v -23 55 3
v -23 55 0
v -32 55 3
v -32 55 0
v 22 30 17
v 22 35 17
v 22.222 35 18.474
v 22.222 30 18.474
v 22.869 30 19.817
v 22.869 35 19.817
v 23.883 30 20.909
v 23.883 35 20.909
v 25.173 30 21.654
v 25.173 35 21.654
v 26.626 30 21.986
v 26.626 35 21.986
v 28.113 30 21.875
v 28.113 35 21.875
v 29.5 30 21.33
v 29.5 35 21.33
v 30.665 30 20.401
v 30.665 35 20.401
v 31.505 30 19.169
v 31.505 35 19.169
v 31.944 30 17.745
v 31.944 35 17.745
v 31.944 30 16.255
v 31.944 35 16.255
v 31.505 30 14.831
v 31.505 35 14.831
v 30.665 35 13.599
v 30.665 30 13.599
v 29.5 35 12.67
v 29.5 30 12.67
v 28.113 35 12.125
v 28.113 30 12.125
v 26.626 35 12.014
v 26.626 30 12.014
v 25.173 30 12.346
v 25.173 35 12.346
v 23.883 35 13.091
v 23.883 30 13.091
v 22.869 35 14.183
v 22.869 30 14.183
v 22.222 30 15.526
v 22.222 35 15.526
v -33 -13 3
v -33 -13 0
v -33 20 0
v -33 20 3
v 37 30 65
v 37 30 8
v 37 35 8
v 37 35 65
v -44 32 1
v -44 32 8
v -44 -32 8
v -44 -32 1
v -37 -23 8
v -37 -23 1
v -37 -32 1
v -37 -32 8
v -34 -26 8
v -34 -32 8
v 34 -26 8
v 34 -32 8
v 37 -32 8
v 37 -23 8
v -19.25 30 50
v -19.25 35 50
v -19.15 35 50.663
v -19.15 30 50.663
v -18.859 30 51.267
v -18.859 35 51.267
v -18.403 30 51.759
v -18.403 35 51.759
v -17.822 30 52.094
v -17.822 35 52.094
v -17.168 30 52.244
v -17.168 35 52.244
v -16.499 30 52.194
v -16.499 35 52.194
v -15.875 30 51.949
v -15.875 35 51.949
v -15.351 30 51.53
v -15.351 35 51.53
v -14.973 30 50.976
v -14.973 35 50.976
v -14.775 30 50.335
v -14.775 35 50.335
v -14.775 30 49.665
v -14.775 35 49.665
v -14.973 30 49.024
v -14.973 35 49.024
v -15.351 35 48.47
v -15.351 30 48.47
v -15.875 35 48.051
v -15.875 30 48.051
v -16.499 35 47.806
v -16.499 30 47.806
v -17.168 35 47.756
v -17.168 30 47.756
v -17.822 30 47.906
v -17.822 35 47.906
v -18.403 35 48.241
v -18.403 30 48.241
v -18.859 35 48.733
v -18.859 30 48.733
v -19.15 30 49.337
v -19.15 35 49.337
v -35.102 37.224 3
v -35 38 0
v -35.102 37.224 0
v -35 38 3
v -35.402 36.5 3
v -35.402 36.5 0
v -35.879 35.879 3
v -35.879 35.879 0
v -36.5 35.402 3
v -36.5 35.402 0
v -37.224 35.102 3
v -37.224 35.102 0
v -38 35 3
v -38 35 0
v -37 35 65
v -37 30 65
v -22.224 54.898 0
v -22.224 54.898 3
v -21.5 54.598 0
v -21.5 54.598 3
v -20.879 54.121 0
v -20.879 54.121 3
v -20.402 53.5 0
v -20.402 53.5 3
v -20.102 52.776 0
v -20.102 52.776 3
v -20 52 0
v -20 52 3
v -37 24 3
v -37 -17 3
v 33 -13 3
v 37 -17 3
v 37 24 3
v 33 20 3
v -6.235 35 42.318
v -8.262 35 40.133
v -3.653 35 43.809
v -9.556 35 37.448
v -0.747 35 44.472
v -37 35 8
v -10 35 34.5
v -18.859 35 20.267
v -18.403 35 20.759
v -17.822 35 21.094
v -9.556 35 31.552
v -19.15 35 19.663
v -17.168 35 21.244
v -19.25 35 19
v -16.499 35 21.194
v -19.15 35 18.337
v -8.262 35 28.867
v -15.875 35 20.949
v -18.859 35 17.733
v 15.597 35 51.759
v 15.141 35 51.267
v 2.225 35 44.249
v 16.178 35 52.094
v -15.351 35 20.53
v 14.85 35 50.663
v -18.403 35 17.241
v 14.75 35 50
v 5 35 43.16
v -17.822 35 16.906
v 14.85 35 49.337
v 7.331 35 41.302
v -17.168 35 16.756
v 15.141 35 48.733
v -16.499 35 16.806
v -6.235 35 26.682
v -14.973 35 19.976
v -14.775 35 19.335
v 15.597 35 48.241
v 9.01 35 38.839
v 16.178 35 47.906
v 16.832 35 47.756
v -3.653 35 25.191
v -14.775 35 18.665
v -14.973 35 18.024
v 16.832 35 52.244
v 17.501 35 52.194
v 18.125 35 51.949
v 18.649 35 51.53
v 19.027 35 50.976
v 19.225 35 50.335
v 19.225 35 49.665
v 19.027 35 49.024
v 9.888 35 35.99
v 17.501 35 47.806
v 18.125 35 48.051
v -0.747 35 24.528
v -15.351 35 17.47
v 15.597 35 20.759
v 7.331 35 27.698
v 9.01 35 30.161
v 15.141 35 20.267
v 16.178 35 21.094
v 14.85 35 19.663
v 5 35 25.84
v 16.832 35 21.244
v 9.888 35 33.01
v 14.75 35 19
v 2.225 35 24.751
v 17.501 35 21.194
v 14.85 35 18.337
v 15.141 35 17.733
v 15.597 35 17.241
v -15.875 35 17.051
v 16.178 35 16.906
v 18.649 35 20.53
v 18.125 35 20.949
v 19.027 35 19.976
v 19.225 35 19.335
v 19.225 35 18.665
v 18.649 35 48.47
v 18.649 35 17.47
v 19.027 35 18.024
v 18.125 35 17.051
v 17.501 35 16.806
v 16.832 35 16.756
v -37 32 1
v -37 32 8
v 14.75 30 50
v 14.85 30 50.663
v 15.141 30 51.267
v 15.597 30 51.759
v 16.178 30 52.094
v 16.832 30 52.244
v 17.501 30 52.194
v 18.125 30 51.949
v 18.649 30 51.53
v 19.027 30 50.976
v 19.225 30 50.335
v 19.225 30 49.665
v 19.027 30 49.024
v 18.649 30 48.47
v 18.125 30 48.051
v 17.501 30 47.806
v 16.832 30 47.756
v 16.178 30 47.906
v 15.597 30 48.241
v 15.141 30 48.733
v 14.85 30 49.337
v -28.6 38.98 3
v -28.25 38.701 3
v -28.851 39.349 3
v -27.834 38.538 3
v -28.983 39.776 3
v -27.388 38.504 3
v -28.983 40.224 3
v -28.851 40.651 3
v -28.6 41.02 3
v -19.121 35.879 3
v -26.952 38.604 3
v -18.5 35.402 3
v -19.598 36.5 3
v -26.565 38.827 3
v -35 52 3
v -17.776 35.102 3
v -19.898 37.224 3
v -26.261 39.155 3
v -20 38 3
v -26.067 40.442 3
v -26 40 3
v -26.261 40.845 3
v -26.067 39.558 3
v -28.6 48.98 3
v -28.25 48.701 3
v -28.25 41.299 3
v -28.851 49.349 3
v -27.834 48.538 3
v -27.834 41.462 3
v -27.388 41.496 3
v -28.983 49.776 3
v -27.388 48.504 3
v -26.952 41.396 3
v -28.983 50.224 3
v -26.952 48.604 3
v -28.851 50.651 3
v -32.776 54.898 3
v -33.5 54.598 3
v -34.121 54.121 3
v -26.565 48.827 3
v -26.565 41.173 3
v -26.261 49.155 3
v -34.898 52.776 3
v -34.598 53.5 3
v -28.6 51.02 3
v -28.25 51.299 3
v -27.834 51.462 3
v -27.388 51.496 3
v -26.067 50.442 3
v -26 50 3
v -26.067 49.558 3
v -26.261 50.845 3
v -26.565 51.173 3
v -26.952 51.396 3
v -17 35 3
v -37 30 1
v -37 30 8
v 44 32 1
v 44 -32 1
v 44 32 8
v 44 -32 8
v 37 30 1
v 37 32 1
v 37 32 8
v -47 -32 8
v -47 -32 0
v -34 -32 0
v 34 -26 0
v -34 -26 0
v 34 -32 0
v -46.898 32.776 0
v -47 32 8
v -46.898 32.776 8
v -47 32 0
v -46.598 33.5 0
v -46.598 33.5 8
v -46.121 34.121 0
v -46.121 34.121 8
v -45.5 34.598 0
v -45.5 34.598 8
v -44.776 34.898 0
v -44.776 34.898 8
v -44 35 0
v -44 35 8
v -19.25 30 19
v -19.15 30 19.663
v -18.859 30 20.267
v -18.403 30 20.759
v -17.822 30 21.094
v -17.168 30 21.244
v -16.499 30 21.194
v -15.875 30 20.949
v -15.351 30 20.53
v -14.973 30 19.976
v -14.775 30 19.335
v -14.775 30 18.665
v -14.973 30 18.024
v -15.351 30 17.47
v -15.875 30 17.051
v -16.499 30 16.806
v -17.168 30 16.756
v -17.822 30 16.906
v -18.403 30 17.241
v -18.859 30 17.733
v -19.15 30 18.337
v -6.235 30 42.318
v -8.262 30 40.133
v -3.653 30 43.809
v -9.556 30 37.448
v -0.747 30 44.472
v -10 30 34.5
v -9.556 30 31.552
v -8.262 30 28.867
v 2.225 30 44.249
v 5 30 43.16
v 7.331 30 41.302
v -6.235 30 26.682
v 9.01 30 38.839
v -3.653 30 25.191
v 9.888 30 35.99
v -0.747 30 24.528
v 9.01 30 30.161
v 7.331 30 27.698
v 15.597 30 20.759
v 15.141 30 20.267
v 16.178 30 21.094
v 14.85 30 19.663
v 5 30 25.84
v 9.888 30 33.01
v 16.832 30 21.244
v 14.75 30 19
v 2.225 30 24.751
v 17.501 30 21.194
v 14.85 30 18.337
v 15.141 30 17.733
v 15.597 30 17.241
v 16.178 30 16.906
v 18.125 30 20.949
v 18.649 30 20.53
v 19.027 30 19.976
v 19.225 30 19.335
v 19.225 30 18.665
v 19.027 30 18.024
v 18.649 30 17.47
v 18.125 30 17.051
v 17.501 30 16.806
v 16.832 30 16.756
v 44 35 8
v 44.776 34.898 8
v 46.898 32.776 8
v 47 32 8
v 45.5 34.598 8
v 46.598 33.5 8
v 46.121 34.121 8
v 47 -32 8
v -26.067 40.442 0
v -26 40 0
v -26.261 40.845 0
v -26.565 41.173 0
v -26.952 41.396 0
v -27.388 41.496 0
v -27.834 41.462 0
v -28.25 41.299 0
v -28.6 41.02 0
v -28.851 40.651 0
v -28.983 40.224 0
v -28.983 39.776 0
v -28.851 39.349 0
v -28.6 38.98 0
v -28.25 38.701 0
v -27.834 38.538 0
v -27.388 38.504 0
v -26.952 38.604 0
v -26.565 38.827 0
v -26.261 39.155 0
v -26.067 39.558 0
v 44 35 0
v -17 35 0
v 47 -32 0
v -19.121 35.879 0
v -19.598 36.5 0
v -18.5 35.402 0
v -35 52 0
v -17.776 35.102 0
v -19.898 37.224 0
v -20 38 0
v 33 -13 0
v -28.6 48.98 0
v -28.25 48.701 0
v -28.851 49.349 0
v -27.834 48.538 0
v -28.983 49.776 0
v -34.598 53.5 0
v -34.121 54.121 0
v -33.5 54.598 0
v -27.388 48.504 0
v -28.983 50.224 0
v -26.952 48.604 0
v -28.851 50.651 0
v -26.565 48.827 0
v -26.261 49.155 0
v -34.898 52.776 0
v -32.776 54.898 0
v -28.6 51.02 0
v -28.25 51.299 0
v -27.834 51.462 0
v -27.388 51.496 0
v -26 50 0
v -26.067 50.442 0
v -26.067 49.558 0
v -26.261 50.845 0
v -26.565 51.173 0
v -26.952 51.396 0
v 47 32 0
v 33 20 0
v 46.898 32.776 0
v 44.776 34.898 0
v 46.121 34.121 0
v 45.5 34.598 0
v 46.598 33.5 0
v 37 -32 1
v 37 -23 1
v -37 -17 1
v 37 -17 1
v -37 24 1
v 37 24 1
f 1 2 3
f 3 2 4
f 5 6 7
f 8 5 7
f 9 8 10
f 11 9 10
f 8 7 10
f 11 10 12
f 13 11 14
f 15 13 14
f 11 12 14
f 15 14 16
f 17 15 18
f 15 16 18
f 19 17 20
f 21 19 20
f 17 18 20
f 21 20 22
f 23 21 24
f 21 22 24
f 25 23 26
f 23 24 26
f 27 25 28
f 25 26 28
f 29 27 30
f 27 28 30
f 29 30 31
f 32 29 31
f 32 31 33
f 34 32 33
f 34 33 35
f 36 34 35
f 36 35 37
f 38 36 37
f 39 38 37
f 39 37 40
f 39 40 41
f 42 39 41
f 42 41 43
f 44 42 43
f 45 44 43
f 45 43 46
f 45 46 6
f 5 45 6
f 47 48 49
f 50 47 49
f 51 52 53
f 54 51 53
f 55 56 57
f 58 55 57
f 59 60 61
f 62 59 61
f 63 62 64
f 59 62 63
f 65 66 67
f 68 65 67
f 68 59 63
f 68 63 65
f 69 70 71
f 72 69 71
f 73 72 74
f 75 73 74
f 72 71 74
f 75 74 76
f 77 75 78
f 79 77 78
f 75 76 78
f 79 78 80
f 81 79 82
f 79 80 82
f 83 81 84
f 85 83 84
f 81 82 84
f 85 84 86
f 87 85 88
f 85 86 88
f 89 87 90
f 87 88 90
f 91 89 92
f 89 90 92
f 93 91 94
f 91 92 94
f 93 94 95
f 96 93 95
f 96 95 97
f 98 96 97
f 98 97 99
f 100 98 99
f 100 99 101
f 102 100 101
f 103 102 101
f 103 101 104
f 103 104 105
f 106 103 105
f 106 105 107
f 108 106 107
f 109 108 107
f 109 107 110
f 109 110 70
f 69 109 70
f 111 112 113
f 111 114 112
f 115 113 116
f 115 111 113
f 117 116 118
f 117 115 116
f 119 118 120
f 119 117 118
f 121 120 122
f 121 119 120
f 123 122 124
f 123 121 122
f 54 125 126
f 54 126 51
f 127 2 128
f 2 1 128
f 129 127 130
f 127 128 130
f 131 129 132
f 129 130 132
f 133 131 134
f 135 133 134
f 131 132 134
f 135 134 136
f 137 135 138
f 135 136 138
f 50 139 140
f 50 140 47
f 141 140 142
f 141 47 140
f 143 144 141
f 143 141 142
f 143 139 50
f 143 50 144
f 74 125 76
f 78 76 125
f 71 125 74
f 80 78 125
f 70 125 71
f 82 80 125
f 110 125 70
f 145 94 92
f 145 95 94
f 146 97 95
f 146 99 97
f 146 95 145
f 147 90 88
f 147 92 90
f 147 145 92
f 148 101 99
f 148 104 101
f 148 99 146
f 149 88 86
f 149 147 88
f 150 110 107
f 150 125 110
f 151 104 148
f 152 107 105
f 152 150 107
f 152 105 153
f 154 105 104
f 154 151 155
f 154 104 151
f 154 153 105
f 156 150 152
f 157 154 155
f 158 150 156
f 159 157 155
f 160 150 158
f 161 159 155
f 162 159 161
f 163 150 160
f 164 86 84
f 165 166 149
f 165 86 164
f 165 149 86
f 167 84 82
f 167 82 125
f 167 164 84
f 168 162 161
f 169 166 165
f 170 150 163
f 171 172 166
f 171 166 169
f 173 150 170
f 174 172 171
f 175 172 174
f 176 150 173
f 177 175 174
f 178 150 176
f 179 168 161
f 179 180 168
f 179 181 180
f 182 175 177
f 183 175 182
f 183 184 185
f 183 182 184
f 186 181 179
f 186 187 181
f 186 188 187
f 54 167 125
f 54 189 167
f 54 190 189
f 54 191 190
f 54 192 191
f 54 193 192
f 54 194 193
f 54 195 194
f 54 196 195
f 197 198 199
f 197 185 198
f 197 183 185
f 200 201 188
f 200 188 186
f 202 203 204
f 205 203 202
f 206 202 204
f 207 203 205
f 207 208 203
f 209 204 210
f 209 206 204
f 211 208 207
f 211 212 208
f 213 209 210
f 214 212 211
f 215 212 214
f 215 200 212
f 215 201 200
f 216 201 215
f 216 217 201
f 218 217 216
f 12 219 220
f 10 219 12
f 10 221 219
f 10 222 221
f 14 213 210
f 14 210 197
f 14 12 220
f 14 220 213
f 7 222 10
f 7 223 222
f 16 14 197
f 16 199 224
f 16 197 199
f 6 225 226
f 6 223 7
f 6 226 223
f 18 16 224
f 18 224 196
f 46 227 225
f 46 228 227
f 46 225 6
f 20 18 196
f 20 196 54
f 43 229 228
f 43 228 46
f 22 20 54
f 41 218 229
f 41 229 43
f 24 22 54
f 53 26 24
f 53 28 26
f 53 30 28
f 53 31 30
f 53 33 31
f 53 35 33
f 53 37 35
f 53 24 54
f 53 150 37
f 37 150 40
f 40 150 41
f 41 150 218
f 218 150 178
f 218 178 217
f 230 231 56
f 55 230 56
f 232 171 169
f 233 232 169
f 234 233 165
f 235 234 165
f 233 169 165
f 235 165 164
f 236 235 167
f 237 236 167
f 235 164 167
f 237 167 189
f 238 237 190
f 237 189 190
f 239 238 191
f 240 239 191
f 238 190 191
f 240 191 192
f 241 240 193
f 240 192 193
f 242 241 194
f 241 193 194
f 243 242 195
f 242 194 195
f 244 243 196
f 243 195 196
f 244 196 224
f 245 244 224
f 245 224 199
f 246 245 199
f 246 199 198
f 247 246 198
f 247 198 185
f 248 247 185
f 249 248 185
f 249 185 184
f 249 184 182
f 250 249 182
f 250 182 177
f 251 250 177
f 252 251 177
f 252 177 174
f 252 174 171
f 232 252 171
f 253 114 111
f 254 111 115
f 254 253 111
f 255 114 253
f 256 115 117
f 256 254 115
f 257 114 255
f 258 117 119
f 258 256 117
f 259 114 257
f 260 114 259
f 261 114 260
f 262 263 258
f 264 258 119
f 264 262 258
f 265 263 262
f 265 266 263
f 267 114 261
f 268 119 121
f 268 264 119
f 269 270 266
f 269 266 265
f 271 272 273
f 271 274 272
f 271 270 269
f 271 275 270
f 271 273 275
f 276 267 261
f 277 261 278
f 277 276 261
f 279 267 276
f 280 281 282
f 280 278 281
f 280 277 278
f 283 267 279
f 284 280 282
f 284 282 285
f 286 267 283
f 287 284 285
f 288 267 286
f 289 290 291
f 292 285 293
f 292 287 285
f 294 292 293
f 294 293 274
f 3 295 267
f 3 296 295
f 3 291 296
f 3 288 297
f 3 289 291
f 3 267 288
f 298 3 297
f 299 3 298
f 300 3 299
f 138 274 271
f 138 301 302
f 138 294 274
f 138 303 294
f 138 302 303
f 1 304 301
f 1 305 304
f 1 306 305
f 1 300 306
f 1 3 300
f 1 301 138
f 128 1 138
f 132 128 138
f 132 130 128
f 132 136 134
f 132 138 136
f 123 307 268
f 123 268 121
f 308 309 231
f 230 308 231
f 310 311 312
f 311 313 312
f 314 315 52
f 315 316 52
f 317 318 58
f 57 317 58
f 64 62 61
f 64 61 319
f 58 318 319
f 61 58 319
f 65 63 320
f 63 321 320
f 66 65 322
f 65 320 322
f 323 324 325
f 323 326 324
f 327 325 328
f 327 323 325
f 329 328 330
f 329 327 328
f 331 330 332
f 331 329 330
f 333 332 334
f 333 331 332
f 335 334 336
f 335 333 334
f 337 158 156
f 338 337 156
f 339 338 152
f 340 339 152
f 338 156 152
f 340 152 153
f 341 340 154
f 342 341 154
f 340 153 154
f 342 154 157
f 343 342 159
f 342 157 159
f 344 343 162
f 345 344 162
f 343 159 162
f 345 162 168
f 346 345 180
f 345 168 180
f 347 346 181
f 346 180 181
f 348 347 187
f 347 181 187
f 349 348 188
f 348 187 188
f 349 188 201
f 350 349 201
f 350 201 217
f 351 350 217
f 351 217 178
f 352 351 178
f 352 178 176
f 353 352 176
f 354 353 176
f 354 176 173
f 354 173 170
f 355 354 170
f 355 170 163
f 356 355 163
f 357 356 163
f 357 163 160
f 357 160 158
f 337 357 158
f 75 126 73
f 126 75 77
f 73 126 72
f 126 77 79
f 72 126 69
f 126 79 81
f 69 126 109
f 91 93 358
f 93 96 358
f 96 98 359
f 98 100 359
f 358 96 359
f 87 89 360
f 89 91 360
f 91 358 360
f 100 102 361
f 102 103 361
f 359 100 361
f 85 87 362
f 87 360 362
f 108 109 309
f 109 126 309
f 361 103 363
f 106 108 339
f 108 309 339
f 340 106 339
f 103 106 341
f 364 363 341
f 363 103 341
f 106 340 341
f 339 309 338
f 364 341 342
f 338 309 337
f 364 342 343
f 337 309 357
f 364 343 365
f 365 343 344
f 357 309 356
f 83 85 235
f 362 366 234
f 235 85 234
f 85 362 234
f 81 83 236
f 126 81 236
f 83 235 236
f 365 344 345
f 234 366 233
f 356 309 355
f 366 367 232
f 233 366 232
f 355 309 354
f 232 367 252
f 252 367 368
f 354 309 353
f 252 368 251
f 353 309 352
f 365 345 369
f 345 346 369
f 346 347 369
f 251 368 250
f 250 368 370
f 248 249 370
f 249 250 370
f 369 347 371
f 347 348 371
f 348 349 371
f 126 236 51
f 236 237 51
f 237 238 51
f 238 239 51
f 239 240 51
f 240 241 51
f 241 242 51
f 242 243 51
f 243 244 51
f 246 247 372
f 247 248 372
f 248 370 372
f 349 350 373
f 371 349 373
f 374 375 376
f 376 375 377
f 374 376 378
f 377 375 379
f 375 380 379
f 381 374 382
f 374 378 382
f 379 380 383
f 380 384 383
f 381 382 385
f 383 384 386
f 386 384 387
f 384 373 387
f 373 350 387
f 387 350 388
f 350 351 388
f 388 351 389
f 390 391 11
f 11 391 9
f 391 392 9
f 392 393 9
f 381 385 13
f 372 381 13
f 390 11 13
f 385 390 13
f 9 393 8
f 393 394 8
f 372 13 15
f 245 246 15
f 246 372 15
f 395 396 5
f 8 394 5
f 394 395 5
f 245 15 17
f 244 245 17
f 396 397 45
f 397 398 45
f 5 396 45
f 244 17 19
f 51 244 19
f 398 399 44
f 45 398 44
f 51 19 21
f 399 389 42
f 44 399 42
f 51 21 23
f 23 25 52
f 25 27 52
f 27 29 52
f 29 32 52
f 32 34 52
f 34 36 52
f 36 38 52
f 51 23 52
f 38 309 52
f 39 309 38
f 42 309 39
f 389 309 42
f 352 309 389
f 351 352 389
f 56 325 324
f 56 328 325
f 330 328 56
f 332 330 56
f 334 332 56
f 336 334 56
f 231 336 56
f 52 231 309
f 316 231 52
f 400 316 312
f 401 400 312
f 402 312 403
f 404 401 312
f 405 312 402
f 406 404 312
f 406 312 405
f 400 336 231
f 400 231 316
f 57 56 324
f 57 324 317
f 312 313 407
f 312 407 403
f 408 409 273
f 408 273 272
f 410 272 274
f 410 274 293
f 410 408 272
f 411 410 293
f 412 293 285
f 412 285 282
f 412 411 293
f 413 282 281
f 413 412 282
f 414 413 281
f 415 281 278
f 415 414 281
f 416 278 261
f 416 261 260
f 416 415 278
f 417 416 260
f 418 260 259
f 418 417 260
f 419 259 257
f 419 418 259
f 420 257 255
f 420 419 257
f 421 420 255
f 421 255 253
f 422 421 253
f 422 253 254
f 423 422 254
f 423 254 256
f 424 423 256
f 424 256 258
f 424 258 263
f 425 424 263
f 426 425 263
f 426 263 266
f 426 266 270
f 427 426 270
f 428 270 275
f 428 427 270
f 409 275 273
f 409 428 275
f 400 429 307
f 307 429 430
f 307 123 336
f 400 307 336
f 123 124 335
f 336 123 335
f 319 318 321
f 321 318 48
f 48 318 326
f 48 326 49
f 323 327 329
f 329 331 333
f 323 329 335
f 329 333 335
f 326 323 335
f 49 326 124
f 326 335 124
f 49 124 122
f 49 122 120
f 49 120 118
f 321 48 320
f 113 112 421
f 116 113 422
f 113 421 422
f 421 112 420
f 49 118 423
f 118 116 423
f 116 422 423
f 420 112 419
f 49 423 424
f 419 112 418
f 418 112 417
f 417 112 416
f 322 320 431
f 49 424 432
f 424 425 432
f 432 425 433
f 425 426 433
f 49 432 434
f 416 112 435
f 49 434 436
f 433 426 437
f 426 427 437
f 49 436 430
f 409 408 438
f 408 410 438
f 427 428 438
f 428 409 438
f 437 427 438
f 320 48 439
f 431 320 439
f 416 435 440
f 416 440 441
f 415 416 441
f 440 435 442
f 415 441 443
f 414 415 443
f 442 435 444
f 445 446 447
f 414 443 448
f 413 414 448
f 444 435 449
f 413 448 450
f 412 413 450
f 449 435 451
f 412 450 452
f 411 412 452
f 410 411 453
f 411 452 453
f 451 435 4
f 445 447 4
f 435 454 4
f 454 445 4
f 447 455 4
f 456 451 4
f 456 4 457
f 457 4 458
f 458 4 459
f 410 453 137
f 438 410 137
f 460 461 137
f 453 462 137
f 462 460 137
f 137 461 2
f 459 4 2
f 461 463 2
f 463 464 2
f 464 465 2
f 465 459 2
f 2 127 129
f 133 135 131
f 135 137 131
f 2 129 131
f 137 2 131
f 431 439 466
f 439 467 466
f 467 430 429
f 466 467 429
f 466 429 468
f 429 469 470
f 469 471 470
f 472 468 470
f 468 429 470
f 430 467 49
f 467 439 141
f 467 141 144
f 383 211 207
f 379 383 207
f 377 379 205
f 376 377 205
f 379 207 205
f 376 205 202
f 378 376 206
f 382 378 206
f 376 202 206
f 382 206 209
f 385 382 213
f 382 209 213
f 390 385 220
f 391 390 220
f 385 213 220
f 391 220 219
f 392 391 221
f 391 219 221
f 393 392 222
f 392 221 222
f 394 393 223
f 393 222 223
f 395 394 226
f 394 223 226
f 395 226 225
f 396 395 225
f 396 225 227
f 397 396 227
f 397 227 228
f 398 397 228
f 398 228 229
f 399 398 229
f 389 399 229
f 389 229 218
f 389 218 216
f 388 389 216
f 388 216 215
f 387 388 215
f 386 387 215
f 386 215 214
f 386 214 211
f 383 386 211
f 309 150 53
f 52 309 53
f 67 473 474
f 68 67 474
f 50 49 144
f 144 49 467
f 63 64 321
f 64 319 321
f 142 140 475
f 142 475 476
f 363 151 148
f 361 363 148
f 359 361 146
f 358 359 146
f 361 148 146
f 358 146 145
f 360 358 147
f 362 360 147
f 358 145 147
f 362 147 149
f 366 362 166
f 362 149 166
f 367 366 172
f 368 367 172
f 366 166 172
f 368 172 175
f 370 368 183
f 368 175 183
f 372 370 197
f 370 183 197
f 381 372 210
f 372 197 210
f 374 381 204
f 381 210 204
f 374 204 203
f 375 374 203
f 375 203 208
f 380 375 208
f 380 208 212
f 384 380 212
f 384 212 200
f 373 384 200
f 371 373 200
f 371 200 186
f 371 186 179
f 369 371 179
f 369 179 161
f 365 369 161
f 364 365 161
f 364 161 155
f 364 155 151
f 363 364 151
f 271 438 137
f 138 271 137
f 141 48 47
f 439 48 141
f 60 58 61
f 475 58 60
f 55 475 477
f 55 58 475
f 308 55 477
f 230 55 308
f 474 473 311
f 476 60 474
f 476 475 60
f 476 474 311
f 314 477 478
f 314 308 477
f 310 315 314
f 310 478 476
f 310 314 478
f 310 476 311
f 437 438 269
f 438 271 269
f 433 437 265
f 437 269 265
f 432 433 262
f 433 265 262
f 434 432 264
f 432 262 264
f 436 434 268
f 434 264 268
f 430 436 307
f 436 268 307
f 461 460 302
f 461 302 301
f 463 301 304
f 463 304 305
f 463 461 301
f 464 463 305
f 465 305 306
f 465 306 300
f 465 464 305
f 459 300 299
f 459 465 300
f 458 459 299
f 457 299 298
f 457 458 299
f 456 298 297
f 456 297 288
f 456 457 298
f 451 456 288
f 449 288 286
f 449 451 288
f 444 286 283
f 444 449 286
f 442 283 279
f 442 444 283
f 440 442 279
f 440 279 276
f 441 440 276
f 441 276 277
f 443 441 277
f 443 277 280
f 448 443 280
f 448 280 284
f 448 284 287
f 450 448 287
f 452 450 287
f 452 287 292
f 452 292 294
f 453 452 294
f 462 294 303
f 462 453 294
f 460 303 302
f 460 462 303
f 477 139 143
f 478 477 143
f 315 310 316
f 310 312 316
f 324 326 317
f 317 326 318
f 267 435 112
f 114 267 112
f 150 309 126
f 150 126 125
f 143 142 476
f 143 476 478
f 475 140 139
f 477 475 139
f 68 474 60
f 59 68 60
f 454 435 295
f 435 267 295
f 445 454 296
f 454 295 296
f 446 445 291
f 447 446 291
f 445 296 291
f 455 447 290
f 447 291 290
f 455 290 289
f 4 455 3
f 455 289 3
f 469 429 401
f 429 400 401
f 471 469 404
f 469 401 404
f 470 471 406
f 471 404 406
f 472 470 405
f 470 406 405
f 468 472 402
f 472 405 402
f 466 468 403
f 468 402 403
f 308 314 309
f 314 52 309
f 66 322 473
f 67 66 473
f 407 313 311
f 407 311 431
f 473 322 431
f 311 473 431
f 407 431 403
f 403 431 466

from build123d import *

# Parameters (mm, degrees)
F0_W     = 66
F0_H     = 33
F0_R     = 1.5
F1_DEPTH = 3
F3_DEPTH = 5
F4_W     = 74
F4_H     = 41
F5_DEPTH = 2
F6_W     = 74
F6_H     = 5
F7_DEPTH = 57
F8_R     = 10
F8_R_2   = 5
F8_R_3   = 2.25
F9_DEPTH = 67.001
F10_R    = 3


with BuildPart() as f1:
    # F0 (on Top) → F1 (new body)
    with BuildSketch(Plane.XY):
        Polygon((47, -32), (47, 35), (-20, 35), (-20, 55), (-35, 55), (-35, 35), (-47, 35), (-47, -32), (-34, -32), (-34, -26), (34, -26), (34, -32), align=None)
        with Locations((0, 3.5)):
            Rectangle(F0_W, F0_H, mode=Mode.SUBTRACT)
        with Locations((-27.5, 40)):
            Circle(F0_R, mode=Mode.SUBTRACT)
        with Locations((-27.5, 50)):
            Circle(F0_R, mode=Mode.SUBTRACT)
    extrude(amount=F1_DEPTH)

    # F2 (on face) → F3 (join)
    with BuildSketch(Plane.XY.offset(3)):
        Polygon((-37, -23), (-37, -32), (-34, -32), (-34, -26), (34, -26), (34, -32), (37, -32), (37, -23), align=None)
        Polygon((-37, 32), (-37, 30), (37, 30), (37, 32), (44, 32), (44, -32), (47, -32), (47, 35), (-20, 35), (-35, 35), (-47, 35), (-47, -32), (-44, -32), (-44, 32), align=None)
    extrude(amount=F3_DEPTH)

    # F4 (on face) → F5 (cut)
    with BuildSketch(Plane.XY.offset(3)):
        Polygon((-37, -23), (37, -23), (37, -32), (44, -32), (44, 32), (37, 32), (37, 30), (-37, 30), (-37, 32), (-44, 32), (-44, -32), (-37, -32), align=None)
        with Locations((0, 3.5)):
            Rectangle(F4_W, F4_H, mode=Mode.SUBTRACT)
    extrude(amount=-F5_DEPTH, mode=Mode.SUBTRACT)

    # F10
    f10_edges = [f1.edges().sort_by_distance(p)[0] for p in [
        (-35, 35, 1.5),
        (-20, 35, 1.5),
        (-35, 55, 1.5),
        (-20, 55, 1.5),
        (-47, 35, 4),
        (47, 35, 4),
    ]]
    fillet(f10_edges, radius=F10_R)


with BuildPart() as f7:
    # F6 (on face) → F7 (new body)
    with BuildSketch(Plane.XY.offset(8)):
        with Locations((0, 32.5)):
            Rectangle(F6_W, F6_H)
    extrude(amount=F7_DEPTH)

    # F8 (on face) → F9 (cut, through all)
    with BuildSketch(Plane(origin=(0, 35, 0), x_dir=(-1, 0, 0), z_dir=(0, 1, 0))):
        with Locations((0, 34.5)):
            Circle(F8_R)
        with Locations((-27, 17)):
            Circle(F8_R_2)
        with Locations((-17, 50)):
            Circle(F8_R_3)
        with Locations((-17, 19)):
            Circle(F8_R_3)
        with Locations((17, 19)):
            Circle(F8_R_3)
        with Locations((17, 50)):
            Circle(F8_R_3)
    extrude(amount=-F9_DEPTH, mode=Mode.SUBTRACT)


solid = Compound([f1.part, f7.part])
